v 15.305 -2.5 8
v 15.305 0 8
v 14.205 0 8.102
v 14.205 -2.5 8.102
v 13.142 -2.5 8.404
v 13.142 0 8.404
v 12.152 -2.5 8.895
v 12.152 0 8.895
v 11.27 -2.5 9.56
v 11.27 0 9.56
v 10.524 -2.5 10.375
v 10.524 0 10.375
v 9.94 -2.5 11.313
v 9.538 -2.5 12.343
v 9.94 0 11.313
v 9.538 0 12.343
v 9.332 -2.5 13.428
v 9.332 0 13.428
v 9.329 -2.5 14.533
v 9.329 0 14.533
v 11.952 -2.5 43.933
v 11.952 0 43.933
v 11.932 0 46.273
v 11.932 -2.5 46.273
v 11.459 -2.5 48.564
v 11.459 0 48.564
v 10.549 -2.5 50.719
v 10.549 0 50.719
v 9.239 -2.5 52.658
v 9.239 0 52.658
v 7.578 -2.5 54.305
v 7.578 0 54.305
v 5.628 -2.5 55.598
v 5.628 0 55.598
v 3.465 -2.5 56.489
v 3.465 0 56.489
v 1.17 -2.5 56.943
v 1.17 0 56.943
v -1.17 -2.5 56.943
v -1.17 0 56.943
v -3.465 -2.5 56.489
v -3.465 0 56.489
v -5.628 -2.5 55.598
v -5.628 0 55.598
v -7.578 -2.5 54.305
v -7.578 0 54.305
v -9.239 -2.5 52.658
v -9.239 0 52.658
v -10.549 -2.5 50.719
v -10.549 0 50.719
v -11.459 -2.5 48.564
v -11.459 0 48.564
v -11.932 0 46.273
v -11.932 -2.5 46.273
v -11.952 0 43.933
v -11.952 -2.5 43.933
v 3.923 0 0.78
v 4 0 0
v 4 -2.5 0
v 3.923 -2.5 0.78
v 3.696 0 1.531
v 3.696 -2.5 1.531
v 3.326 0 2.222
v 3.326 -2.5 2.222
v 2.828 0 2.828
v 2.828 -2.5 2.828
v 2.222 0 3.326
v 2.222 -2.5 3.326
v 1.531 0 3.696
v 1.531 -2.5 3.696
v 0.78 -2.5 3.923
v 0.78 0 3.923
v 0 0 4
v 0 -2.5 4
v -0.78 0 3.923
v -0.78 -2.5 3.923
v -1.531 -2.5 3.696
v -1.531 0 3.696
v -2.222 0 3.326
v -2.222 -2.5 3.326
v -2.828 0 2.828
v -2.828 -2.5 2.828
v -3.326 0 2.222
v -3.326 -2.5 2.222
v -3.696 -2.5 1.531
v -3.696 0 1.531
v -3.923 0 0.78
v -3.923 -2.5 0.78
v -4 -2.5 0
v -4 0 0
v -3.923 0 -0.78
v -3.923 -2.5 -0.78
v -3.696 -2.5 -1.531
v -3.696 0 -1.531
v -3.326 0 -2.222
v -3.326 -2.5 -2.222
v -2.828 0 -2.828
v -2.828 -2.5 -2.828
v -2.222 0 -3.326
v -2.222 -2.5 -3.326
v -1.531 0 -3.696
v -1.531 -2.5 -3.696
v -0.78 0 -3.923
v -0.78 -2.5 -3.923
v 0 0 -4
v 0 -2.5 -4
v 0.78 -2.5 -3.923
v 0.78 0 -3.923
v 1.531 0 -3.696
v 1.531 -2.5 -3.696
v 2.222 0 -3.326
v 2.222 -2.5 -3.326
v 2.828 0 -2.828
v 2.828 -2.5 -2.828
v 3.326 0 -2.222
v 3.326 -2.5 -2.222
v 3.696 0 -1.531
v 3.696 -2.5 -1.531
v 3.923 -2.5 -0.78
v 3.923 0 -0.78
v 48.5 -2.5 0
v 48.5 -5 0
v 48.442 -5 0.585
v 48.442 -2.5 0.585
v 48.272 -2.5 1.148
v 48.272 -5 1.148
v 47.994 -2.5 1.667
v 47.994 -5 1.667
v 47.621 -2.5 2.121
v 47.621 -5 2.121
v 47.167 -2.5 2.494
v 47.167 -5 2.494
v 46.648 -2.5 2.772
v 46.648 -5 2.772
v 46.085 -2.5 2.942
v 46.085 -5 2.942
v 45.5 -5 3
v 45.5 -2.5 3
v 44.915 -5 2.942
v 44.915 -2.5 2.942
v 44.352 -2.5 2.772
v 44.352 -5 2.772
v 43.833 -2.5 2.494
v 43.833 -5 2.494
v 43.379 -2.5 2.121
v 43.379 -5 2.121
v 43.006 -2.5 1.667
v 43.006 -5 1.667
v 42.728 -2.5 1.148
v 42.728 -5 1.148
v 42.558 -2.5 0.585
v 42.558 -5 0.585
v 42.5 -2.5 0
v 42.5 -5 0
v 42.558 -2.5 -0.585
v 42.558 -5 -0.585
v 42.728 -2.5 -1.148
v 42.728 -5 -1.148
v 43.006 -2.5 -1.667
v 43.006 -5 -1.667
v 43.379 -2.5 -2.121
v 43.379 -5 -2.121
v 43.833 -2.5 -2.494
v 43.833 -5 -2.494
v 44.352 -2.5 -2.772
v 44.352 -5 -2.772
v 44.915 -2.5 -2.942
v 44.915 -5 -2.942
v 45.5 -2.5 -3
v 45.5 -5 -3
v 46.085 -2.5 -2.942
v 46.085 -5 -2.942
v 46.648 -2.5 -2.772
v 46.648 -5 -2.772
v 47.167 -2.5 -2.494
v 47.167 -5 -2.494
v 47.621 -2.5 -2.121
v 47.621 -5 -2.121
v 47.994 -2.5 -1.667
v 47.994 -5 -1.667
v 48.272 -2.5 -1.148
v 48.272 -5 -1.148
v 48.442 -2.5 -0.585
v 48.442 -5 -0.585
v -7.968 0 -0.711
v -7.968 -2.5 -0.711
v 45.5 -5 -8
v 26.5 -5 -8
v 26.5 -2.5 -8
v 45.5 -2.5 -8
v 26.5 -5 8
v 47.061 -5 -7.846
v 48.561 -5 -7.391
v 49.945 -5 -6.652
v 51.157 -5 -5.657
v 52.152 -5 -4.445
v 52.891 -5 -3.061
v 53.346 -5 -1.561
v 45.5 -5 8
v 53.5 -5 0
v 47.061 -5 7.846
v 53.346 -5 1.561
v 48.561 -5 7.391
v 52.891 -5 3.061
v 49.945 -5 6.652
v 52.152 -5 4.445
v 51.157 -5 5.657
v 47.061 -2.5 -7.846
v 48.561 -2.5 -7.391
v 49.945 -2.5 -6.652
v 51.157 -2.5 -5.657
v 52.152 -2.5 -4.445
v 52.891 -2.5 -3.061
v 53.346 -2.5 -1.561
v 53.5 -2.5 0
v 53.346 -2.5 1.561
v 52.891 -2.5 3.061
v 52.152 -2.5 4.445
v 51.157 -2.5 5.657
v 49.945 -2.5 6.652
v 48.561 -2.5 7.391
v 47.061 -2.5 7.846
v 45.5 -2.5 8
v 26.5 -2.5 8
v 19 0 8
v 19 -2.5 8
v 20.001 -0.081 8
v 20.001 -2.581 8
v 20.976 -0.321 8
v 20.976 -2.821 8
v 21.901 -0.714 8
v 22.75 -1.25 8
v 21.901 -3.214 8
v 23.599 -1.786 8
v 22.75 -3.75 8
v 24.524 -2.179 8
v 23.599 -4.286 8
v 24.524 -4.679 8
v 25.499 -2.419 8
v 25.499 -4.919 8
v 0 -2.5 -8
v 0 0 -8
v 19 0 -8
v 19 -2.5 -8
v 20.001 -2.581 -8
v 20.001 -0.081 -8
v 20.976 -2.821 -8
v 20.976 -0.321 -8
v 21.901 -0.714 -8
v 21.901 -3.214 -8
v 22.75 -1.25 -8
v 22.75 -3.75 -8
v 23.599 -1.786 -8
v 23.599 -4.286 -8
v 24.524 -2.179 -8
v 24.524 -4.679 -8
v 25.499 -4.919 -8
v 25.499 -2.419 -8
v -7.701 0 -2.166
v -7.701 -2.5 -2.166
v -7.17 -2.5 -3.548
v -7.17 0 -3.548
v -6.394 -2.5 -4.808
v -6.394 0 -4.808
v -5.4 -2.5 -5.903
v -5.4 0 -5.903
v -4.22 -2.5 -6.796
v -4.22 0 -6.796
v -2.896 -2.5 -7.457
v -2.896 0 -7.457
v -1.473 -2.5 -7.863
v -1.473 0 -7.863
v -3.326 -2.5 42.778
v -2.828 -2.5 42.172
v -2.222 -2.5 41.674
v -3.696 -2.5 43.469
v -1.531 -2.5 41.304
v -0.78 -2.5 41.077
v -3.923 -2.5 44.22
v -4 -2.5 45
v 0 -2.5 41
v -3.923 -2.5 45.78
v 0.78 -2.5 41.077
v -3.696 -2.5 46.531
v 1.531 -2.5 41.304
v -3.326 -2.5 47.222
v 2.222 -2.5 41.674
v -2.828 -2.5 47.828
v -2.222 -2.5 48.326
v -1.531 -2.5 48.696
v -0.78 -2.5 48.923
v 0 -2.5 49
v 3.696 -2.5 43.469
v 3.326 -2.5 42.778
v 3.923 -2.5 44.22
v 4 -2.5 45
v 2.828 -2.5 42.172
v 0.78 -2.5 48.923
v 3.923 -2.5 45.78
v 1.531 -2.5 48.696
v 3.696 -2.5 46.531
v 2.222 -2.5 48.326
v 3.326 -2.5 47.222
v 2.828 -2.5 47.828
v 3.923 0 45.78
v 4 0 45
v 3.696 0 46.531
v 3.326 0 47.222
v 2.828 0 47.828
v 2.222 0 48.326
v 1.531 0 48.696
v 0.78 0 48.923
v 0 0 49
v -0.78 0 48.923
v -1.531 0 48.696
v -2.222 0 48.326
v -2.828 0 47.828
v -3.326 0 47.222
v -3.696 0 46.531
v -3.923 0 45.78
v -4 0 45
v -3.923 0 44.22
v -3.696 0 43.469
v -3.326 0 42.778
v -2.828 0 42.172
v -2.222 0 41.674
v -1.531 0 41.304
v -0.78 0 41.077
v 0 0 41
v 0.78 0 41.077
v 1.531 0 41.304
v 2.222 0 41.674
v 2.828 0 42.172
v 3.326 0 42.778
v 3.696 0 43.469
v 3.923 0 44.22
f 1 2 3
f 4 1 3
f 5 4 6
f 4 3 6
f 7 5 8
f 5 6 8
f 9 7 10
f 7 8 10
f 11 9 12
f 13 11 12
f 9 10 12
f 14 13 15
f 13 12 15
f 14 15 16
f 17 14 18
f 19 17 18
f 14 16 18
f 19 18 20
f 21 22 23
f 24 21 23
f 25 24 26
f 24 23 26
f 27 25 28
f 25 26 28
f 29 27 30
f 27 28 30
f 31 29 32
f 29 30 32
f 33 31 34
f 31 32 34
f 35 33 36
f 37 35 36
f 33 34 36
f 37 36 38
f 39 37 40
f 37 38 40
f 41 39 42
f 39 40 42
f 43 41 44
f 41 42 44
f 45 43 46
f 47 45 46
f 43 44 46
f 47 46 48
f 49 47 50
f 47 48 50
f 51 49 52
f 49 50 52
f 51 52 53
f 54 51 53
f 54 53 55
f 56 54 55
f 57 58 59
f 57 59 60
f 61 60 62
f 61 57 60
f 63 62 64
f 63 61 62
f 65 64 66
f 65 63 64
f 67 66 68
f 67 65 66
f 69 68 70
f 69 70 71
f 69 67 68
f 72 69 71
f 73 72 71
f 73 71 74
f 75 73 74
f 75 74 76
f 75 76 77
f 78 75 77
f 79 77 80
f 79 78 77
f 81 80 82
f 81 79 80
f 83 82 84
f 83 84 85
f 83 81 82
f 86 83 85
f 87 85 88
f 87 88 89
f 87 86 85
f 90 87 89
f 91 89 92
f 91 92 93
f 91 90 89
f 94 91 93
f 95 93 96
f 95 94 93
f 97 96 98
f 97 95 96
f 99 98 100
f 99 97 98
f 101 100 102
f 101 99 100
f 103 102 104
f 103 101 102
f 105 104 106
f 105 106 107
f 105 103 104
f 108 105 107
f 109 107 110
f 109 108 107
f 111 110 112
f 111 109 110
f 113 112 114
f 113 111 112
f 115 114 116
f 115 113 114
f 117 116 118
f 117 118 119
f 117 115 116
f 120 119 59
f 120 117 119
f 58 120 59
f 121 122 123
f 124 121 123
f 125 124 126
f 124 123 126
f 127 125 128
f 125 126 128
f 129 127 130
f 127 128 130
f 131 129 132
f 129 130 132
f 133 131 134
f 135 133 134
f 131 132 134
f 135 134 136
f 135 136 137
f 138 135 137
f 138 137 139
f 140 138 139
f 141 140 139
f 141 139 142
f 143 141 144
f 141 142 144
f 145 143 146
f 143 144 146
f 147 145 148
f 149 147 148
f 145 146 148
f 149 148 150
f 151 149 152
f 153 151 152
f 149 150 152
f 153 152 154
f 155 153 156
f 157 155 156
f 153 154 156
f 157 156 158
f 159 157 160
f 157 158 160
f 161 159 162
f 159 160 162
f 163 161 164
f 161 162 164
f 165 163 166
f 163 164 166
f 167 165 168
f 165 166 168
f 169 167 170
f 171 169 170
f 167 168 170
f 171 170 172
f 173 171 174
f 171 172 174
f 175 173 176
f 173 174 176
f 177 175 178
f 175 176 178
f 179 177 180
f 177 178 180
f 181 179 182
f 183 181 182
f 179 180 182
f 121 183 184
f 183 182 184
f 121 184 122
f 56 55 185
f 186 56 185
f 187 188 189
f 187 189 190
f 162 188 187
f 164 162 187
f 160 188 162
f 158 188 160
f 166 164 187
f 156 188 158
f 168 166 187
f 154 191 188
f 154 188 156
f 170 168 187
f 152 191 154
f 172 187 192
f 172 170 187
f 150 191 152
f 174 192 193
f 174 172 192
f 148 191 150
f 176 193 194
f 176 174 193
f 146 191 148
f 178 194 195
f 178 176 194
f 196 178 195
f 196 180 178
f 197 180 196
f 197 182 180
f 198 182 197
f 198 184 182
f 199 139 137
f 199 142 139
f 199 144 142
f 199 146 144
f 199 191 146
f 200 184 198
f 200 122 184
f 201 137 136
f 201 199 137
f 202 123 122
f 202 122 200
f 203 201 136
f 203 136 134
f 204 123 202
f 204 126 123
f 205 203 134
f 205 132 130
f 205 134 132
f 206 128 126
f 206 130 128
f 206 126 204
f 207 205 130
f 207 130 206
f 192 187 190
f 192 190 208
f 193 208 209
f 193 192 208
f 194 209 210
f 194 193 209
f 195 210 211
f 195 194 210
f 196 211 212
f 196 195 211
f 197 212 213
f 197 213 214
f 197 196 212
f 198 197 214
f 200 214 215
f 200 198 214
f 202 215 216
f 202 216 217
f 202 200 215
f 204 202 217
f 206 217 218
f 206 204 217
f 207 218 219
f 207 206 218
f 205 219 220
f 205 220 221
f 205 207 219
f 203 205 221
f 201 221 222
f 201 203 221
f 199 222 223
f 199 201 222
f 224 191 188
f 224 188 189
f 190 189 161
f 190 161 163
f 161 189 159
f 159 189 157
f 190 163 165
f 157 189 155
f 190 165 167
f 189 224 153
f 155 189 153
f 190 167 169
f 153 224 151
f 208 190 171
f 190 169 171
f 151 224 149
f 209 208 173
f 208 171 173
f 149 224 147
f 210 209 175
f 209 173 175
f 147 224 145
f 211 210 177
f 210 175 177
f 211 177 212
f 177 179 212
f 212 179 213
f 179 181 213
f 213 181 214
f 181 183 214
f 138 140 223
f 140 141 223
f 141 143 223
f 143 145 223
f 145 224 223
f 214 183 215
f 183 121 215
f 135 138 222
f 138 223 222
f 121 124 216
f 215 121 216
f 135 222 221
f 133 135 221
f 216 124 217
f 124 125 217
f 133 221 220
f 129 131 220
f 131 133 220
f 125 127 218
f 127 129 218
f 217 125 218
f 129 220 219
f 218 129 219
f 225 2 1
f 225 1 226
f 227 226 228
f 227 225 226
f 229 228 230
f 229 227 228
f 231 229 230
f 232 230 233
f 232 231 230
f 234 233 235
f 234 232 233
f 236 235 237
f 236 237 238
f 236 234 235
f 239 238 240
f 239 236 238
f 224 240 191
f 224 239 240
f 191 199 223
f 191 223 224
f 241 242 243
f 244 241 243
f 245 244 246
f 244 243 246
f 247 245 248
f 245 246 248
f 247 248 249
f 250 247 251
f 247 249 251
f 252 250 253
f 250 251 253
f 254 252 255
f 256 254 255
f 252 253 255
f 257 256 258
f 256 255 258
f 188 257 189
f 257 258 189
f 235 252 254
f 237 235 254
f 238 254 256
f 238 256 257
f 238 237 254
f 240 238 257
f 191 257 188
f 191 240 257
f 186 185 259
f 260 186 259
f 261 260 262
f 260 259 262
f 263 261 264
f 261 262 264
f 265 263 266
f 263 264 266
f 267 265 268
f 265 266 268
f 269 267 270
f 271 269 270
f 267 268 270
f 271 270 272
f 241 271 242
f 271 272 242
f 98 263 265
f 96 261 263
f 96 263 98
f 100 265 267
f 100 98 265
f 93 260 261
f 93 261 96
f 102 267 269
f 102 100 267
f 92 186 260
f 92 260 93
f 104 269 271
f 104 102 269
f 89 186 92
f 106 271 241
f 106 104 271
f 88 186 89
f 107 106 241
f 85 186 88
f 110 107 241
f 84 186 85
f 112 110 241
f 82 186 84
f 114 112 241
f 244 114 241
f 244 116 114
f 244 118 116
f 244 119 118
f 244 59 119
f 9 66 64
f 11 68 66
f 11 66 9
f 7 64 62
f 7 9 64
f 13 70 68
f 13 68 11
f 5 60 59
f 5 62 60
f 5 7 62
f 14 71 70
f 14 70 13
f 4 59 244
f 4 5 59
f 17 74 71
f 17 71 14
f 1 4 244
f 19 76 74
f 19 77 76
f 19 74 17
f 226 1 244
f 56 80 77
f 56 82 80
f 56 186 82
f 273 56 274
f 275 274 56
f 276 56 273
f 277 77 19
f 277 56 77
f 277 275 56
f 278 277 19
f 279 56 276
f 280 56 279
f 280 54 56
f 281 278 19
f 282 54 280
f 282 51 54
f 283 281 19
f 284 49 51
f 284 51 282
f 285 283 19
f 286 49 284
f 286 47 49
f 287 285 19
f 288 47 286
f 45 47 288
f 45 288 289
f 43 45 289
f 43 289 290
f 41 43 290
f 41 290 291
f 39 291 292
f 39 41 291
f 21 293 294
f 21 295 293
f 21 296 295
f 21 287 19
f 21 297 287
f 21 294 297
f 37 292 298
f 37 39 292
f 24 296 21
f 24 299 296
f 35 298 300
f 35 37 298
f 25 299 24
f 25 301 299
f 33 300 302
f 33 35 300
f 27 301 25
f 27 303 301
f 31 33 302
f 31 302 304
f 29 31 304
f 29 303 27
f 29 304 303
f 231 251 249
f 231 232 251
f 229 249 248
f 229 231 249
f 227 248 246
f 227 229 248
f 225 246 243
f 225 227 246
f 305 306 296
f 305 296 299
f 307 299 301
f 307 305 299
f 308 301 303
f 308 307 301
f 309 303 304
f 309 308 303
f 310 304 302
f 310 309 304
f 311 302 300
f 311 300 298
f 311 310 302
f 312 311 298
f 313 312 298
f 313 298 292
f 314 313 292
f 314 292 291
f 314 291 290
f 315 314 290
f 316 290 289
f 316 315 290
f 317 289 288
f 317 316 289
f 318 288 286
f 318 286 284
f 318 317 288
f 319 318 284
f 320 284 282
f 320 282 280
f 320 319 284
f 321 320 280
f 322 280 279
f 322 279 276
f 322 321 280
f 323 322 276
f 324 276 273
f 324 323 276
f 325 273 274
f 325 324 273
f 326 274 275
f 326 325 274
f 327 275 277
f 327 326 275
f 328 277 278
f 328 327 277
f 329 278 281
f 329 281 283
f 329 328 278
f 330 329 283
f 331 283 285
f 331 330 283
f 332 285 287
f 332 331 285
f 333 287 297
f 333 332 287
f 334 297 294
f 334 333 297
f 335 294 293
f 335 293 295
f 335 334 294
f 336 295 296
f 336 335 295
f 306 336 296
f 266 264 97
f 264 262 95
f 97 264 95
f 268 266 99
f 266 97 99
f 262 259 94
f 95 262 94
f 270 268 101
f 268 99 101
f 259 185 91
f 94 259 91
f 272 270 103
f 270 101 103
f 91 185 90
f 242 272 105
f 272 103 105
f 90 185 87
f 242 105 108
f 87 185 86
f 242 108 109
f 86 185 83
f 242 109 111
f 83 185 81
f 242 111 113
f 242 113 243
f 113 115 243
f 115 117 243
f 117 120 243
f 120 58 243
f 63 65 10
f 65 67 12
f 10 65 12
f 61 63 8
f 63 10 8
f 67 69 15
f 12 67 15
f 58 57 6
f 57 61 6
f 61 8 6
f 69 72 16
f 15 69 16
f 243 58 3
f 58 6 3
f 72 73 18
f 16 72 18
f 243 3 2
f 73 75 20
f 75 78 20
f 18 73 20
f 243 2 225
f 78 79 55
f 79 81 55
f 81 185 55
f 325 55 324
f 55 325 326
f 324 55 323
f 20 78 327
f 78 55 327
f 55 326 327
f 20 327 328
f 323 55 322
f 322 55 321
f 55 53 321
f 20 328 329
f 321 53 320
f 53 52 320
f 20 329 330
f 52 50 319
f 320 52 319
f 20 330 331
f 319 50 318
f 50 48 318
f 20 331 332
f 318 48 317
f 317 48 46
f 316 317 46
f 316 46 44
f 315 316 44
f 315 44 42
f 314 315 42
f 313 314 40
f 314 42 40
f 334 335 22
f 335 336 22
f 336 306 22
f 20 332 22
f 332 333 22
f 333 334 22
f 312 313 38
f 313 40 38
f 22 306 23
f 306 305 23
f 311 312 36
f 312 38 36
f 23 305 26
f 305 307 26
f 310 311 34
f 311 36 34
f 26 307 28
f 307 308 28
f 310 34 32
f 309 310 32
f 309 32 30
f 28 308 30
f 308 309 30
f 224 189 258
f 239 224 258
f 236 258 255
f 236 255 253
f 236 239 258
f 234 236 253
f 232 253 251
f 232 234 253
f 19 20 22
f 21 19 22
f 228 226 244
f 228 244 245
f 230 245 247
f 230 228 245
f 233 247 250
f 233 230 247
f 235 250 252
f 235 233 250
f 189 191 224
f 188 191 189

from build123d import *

# Parameters (mm, degrees)
F0_R     = 4
F1_DEPTH = 2.5
F3_DEPTH = 8
F5_R     = 3
F6_DEPTH = 2.5


with BuildPart() as f1:
    # F0 (on Front) → F1 (new body)
    with BuildSketch(Plane.XZ):
        with BuildLine():
            ThreePointArc((-7.9683323844, -0.7111111111), (-5.3995884617, -5.902918299), (0, -8))
            Line((0, -8), (19, -8))
            Line((19, -8), (19, 8))
            Line((19, 8), (15.3050286651, 8))
            ThreePointArc((15.3050286651, 8), (10.8778399408, 9.9503086537), (9.3287793768, 14.5333333333))
            Line((9.3287793768, 14.5333333333), (11.9524985765, 43.9333333333))
            ThreePointArc((11.9524985765, 43.9333333333), (0, 57), (-11.9524985765, 43.9333333333))
            Line((-11.9524985765, 43.9333333333), (-7.9683323844, -0.7111111111))
        make_face()
        Circle(F0_R, mode=Mode.SUBTRACT)
        with Locations((0, 45)):
            Circle(F0_R, mode=Mode.SUBTRACT)
    extrude(amount=F1_DEPTH)

    # F2 (on Top) → F3 (join, symmetric)
    with BuildSketch(Plane.XY):
        with BuildLine():
            Line((19, 0), (19, -2.5))
            ThreePointArc((19, -2.5), (20.9764235376, -2.8207293872), (22.75, -3.75))
            ThreePointArc((22.75, -3.75), (24.5235764624, -4.6792706128), (26.5, -5))
            Line((26.5, -5), (26.5, -2.5))
            ThreePointArc((26.5, -2.5), (24.5235764624, -2.1792706128), (22.75, -1.25))
            ThreePointArc((22.75, -1.25), (20.9764235376, -0.3207293872), (19, 0))
        make_face()
    extrude(amount=F3_DEPTH, both=True)


with BuildPart() as f6:
    # F5 (on offset) → F6 (new body)
    with BuildSketch(Plane.XZ.offset(5)):
        with BuildLine():
            Line((45.5, 8), (26.5, 8))
            Line((26.5, 8), (26.5, -8))
            Line((26.5, -8), (45.5, -8))
            ThreePointArc((45.5, -8), (53.5, 0), (45.5, 8))
        make_face()
        with Locations((45.5, 0)):
            Circle(F5_R, mode=Mode.SUBTRACT)
    extrude(amount=-F6_DEPTH)


solid = Compound([f1.part, f6.part])
